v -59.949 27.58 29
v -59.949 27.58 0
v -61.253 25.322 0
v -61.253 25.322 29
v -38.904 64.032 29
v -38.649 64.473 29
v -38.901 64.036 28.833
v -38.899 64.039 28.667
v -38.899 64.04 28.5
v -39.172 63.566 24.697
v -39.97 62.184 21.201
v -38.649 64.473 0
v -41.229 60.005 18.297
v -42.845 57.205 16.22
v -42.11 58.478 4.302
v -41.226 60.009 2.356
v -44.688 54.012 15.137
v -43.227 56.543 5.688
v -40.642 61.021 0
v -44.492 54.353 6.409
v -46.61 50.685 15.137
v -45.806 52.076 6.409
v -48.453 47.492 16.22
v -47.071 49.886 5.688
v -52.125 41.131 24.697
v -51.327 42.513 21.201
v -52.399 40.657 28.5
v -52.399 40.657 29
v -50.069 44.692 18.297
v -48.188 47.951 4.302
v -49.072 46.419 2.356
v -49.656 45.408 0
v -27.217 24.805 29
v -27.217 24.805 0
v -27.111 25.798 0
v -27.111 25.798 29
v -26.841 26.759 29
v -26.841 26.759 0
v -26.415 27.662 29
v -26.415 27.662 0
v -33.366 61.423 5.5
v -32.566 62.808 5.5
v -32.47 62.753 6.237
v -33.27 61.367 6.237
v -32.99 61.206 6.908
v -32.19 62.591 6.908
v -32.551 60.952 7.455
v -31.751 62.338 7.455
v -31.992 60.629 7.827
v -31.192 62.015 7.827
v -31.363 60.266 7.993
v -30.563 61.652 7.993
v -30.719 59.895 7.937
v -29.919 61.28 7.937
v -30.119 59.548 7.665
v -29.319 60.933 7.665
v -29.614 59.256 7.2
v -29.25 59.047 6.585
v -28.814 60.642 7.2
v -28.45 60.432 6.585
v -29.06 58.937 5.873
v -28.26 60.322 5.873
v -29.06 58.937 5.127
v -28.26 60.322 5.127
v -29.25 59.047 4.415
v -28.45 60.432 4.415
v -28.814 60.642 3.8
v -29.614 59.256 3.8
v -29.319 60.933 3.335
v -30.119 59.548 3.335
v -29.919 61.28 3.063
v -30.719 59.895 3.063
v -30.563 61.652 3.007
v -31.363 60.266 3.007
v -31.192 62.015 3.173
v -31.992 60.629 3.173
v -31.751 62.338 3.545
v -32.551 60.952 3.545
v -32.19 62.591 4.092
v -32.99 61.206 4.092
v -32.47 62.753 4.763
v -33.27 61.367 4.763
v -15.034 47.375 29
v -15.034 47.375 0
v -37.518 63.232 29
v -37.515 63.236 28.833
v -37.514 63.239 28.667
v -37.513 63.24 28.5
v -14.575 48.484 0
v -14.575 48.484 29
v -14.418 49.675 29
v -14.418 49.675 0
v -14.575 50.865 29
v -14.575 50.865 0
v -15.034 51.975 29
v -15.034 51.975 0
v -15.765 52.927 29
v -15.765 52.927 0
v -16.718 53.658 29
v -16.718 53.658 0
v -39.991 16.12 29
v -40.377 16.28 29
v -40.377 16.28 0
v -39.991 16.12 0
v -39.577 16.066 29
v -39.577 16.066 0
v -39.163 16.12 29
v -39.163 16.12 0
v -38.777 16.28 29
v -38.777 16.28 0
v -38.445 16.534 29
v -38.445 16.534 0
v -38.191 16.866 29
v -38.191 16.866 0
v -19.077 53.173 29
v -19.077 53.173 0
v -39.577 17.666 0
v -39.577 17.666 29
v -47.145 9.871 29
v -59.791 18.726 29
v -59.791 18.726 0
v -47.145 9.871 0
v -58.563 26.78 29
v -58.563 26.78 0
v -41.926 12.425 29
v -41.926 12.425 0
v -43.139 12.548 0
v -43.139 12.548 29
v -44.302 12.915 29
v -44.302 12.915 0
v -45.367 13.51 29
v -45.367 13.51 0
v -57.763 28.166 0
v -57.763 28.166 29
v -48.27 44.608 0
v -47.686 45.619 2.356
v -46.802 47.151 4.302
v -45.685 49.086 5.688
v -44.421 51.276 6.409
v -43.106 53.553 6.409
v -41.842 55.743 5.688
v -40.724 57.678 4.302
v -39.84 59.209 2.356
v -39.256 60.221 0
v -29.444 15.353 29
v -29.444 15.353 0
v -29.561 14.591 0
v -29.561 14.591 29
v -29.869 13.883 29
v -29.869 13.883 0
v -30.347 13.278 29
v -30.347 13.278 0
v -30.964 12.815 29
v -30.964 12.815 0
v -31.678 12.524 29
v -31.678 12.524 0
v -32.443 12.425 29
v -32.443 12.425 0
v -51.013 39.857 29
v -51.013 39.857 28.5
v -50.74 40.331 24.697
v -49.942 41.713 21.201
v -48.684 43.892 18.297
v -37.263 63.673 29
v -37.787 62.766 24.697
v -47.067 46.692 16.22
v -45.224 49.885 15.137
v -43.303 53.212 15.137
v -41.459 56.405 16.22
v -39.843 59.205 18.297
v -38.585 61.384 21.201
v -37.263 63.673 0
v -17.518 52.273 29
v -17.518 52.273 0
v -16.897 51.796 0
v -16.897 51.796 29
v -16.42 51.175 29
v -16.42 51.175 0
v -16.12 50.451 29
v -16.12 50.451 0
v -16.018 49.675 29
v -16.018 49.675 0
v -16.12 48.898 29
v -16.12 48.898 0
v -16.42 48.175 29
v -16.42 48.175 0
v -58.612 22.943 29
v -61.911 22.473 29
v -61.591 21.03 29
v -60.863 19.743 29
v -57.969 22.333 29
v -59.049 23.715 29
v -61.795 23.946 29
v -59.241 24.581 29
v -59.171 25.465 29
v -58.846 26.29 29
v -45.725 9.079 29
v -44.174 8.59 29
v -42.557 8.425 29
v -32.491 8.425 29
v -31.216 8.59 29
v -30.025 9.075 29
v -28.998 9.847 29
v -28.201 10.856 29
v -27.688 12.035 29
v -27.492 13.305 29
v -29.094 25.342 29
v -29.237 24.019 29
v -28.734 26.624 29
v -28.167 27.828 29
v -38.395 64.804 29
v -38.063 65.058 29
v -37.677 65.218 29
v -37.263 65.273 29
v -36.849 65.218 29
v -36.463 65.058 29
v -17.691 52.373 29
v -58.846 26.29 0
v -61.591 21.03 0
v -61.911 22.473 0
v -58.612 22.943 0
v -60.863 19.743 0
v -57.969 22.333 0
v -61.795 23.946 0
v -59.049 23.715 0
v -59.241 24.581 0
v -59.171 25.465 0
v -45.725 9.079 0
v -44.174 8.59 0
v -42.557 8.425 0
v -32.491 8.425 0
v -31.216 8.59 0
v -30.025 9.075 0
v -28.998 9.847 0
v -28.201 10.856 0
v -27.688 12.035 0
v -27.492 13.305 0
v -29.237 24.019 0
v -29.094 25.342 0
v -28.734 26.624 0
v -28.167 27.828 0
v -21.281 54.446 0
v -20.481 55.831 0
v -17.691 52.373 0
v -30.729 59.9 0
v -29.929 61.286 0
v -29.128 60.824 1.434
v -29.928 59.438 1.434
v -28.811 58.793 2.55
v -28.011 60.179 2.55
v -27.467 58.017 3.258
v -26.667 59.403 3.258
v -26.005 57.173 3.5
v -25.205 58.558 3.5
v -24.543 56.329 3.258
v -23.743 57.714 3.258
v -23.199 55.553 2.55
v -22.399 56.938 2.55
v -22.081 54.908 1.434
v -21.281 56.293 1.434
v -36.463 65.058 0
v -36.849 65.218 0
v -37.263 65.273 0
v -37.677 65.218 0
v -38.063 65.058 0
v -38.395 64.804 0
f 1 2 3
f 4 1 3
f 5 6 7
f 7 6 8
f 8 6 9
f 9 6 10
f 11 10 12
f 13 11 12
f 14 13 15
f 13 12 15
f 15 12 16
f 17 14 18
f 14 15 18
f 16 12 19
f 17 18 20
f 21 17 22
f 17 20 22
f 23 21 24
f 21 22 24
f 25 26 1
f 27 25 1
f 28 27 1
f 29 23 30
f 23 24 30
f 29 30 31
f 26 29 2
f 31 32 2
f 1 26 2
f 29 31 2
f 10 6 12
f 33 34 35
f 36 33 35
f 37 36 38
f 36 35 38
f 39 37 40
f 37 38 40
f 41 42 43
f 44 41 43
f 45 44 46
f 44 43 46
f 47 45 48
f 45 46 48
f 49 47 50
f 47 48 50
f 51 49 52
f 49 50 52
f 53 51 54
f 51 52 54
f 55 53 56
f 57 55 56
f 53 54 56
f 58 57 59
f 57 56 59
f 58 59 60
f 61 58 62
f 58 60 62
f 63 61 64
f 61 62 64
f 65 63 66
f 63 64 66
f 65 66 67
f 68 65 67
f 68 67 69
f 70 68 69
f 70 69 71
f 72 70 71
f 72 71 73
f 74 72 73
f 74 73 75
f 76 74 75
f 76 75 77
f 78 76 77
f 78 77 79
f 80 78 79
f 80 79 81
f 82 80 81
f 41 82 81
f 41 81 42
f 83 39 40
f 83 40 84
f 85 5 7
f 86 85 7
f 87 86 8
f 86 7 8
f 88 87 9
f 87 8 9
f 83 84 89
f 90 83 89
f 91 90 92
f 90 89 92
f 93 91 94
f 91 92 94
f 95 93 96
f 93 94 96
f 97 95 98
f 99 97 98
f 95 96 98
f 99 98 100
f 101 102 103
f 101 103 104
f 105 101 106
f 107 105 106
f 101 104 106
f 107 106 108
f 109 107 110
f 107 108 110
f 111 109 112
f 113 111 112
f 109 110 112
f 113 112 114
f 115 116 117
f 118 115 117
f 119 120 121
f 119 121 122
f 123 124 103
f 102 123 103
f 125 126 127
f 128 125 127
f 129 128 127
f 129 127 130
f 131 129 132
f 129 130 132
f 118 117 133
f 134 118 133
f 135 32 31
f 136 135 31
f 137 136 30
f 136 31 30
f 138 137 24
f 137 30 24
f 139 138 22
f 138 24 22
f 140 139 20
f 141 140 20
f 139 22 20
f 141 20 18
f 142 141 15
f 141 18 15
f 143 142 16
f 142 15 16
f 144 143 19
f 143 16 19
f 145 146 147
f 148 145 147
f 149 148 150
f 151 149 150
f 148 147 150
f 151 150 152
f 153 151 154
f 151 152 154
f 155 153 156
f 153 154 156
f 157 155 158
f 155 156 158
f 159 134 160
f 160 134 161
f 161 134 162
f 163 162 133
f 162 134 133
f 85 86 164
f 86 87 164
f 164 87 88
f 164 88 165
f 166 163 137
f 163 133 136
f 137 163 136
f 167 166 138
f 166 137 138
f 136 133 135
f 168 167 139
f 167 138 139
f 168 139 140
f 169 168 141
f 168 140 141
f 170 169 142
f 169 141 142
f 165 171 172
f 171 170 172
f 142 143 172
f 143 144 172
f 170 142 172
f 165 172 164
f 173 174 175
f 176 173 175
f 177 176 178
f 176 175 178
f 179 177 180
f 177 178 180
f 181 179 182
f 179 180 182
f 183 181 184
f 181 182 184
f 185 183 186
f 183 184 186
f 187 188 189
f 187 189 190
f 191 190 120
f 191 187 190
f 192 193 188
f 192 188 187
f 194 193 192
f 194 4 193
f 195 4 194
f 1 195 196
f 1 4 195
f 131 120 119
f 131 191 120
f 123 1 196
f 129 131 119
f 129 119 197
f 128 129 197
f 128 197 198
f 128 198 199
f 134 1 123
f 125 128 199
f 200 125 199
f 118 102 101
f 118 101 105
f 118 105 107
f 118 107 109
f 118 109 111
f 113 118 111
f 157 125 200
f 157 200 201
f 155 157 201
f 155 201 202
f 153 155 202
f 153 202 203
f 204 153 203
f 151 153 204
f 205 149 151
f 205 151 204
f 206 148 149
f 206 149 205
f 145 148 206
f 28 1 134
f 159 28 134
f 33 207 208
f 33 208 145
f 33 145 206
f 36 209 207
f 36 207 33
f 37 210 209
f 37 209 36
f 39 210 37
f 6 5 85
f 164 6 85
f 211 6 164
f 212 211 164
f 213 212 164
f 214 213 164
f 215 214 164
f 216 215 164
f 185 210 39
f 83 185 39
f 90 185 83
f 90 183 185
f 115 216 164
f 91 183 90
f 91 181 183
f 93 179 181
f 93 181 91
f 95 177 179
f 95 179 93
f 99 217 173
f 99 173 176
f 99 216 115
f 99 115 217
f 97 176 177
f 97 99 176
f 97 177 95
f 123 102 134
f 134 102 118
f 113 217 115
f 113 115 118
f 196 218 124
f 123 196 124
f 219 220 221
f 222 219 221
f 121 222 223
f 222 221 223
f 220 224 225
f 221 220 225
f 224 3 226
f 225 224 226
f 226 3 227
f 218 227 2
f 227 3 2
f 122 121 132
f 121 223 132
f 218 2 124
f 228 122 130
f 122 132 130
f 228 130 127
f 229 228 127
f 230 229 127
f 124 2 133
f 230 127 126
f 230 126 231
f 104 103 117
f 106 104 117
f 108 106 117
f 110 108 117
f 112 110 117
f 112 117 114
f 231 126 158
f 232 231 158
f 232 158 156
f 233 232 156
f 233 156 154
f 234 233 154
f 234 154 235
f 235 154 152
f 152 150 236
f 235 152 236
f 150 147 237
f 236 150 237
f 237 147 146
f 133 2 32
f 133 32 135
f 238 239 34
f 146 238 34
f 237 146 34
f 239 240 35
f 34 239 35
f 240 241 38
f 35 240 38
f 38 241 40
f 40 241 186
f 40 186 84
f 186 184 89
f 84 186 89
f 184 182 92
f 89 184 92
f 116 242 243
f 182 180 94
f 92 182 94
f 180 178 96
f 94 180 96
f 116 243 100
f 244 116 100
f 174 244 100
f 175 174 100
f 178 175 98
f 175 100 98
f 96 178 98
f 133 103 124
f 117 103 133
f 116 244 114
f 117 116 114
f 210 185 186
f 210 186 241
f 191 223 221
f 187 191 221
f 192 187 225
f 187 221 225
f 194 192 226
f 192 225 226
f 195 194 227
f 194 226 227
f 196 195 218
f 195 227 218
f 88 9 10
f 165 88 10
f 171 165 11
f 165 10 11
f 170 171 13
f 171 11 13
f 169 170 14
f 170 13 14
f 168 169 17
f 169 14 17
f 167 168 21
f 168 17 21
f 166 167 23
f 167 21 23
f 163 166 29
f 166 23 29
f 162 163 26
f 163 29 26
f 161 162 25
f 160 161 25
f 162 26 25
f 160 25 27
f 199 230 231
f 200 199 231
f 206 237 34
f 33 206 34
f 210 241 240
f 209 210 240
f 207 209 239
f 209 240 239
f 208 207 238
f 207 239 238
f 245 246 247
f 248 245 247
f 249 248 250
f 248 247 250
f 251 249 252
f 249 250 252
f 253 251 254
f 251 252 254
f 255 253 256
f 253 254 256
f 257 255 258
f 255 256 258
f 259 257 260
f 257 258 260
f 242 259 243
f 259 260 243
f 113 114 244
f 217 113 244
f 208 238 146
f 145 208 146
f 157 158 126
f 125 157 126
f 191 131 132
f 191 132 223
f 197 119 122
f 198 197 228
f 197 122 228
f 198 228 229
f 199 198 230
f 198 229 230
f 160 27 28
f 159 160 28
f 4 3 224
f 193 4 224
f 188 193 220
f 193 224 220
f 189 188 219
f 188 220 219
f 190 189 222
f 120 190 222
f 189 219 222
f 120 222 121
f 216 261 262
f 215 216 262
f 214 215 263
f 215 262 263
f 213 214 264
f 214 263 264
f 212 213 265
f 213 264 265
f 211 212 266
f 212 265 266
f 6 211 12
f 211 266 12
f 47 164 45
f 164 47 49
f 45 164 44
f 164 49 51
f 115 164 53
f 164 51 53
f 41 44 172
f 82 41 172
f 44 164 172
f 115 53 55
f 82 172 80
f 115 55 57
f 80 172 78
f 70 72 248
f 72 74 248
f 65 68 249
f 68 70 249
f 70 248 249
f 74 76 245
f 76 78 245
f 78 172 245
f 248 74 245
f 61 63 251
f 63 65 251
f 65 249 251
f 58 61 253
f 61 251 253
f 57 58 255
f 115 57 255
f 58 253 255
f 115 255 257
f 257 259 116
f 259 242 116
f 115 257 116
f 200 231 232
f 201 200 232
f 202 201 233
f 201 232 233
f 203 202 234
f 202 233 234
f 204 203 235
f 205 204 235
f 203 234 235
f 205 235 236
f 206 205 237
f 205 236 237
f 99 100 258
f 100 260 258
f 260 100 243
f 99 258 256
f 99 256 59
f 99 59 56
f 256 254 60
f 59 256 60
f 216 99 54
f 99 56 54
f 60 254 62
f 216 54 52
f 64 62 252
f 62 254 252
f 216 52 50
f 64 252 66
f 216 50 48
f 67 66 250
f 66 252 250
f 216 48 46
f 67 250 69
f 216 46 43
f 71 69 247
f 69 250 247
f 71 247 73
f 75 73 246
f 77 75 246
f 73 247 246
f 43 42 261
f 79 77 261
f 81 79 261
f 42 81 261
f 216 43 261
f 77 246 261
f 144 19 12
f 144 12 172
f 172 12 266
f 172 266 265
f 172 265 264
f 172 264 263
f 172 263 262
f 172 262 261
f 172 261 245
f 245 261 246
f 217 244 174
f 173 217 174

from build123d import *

# Parameters (mm, degrees)
F1_DEPTH = 29
F4_DEPTH = 2
F3_R     = 2.5
F5_DEPTH = 2


with BuildPart() as f1:
    # F0 (on Top) → F1 (new body)
    with BuildSketch(Plane.XY):
        with BuildLine():
            ThreePointArc((-15.034174097, 47.3746718097), (-14.5746321535, 50.8652394172), (-16.7178909544, 53.6583886671))
            Line((-16.7178909544, 53.6583886671), (-36.4632701607, 65.0583886671))
            ThreePointArc((-36.4632701607, 65.0583886671), (-37.6773806328, 65.2182293432), (-38.6489108067, 64.4727480211))
            Line((-38.6489108067, 64.4727480211), (-59.9489108067, 27.5800658199))
            Line((-59.9489108067, 27.5800658199), (-61.2528943298, 25.3215001057))
            ThreePointArc((-61.2528943298, 25.3215001057), (-61.8042473465, 21.739302036), (-59.7906494926, 18.7257398843))
            Line((-59.7906494926, 18.7257398843), (-47.1451993997, 9.8713004052))
            ThreePointArc((-47.1451993997, 9.8713004052), (-44.962234305, 8.7947811535), (-42.5565879089, 8.4245167595))
            Line((-42.5565879089, 8.4245167595), (-32.4906988756, 8.4245167595))
            ThreePointArc((-32.4906988756, 8.4245167595), (-28.9976482356, 9.8470040444), (-27.492125644, 13.3050778688))
            Line((-27.492125644, 13.3050778688), (-27.2173277766, 24.8054966721))
            ThreePointArc((-27.2173277766, 24.8054966721), (-26.9956322368, 26.2841998916), (-26.4151923214, 27.6621700032))
            Line((-26.4151923214, 27.6621700032), (-15.034174097, 47.3746718097))
        make_face()
        with BuildLine():
            Line((-58.5632701607, 26.7800658199), (-40.3767366812, 16.2800658199))
            ThreePointArc((-40.3767366812, 16.2800658199), (-39.162626209, 16.1202251439), (-38.1910960352, 16.8657064659))
            Line((-38.1910960352, 16.8657064659), (-17.6910960352, 52.3727480211))
            Line((-17.6910960352, 52.3727480211), (-17.5178909544, 52.2727480211))
            ThreePointArc((-17.5178909544, 52.2727480211), (-16.1201134755, 50.451128945), (-16.419814743, 48.1746718097))
            Line((-16.419814743, 48.1746718097), (-28.1671840961, 27.8276312349))
            ThreePointArc((-28.1671840961, 27.8276312349), (-28.9411039834, 25.9903377528), (-29.2366980364, 24.01873346))
            Line((-29.2366980364, 24.01873346), (-29.4437657435, 15.3528534251))
            ThreePointArc((-29.4437657435, 15.3528534251), (-30.3470792985, 13.2780091304), (-32.4429096825, 12.4245167595))
            Line((-32.4429096825, 12.4245167595), (-41.9259903312, 12.4245167595))
            ThreePointArc((-41.9259903312, 12.4245167595), (-43.7302251282, 12.702215055), (-45.3674489493, 13.5096044937))
            Line((-45.3674489493, 13.5096044937), (-57.9685892112, 22.3330178952))
            ThreePointArc((-57.9685892112, 22.3330178952), (-59.1767479235, 24.1411551862), (-58.8459361135, 26.290474028))
            Line((-58.8459361135, 26.290474028), (-58.5632701607, 26.7800658199))
        make_face(mode=Mode.SUBTRACT)
        Polygon((-37.2632701607, 63.6727480211), (-19.0767366812, 53.1727480211), (-39.5767366812, 17.6657064659), (-57.7632701607, 28.1657064659), align=None, mode=Mode.SUBTRACT)
    extrude(amount=F1_DEPTH)

    # F2 (on face) → F4 (cut)
    with BuildSketch(Plane(origin=(-56.9042019241, 32.8536562989, 0), x_dir=(-0.5, -0.8660254038, 0), z_dir=(-0.8660254038, 0.5, 0))):
        with BuildLine():
            ThreePointArc((-36.0013197979, 29), (-36.0082664269, 28.7500428927), (-36.0105822347, 28.5))
            ThreePointArc((-36.0105822347, 28.5), (-22.5105822347, 15), (-9.0105822347, 28.5))
            ThreePointArc((-9.0105822347, 28.5), (-9.0128980425, 28.7500428927), (-9.0198446715, 29))
            Line((-9.0198446715, 29), (-36.0013197979, 29))
        make_face()
        with BuildLine():
            ThreePointArc((-9.0198446715, 29), (-9.0128980425, 28.7500428927), (-9.0105822347, 28.5))
            Line((-9.0105822347, 28.5), (-9.0105822347, 29))
            Line((-9.0105822347, 29), (-9.0198446715, 29))
        make_face()
        with BuildLine():
            ThreePointArc((-14.496704046, 0), (-23.5105822347, 6.5), (-32.5244604233, 0))
            Line((-32.5244604233, 0), (-14.496704046, 0))
        make_face()
    extrude(amount=-F4_DEPTH, mode=Mode.SUBTRACT)

    # F3 (on face) → F5 (cut)
    with BuildSketch(Plane(origin=(19.0552911173, 33.0047323683, 0), x_dir=(-0.8660254038, 0.5, 0), z_dir=(0.5, 0.8660254038, 0))):
        with BuildLine():
            Line((45.6529565405, 0), (56.5616686551, 0))
            ThreePointArc((56.5616686551, 0), (51.1073125978, 3.5), (45.6529565405, 0))
        make_face()
        with Locations((57.1073125978, 5.5)):
            Circle(F3_R)
    extrude(amount=-F5_DEPTH, mode=Mode.SUBTRACT)


solid = f1.part
